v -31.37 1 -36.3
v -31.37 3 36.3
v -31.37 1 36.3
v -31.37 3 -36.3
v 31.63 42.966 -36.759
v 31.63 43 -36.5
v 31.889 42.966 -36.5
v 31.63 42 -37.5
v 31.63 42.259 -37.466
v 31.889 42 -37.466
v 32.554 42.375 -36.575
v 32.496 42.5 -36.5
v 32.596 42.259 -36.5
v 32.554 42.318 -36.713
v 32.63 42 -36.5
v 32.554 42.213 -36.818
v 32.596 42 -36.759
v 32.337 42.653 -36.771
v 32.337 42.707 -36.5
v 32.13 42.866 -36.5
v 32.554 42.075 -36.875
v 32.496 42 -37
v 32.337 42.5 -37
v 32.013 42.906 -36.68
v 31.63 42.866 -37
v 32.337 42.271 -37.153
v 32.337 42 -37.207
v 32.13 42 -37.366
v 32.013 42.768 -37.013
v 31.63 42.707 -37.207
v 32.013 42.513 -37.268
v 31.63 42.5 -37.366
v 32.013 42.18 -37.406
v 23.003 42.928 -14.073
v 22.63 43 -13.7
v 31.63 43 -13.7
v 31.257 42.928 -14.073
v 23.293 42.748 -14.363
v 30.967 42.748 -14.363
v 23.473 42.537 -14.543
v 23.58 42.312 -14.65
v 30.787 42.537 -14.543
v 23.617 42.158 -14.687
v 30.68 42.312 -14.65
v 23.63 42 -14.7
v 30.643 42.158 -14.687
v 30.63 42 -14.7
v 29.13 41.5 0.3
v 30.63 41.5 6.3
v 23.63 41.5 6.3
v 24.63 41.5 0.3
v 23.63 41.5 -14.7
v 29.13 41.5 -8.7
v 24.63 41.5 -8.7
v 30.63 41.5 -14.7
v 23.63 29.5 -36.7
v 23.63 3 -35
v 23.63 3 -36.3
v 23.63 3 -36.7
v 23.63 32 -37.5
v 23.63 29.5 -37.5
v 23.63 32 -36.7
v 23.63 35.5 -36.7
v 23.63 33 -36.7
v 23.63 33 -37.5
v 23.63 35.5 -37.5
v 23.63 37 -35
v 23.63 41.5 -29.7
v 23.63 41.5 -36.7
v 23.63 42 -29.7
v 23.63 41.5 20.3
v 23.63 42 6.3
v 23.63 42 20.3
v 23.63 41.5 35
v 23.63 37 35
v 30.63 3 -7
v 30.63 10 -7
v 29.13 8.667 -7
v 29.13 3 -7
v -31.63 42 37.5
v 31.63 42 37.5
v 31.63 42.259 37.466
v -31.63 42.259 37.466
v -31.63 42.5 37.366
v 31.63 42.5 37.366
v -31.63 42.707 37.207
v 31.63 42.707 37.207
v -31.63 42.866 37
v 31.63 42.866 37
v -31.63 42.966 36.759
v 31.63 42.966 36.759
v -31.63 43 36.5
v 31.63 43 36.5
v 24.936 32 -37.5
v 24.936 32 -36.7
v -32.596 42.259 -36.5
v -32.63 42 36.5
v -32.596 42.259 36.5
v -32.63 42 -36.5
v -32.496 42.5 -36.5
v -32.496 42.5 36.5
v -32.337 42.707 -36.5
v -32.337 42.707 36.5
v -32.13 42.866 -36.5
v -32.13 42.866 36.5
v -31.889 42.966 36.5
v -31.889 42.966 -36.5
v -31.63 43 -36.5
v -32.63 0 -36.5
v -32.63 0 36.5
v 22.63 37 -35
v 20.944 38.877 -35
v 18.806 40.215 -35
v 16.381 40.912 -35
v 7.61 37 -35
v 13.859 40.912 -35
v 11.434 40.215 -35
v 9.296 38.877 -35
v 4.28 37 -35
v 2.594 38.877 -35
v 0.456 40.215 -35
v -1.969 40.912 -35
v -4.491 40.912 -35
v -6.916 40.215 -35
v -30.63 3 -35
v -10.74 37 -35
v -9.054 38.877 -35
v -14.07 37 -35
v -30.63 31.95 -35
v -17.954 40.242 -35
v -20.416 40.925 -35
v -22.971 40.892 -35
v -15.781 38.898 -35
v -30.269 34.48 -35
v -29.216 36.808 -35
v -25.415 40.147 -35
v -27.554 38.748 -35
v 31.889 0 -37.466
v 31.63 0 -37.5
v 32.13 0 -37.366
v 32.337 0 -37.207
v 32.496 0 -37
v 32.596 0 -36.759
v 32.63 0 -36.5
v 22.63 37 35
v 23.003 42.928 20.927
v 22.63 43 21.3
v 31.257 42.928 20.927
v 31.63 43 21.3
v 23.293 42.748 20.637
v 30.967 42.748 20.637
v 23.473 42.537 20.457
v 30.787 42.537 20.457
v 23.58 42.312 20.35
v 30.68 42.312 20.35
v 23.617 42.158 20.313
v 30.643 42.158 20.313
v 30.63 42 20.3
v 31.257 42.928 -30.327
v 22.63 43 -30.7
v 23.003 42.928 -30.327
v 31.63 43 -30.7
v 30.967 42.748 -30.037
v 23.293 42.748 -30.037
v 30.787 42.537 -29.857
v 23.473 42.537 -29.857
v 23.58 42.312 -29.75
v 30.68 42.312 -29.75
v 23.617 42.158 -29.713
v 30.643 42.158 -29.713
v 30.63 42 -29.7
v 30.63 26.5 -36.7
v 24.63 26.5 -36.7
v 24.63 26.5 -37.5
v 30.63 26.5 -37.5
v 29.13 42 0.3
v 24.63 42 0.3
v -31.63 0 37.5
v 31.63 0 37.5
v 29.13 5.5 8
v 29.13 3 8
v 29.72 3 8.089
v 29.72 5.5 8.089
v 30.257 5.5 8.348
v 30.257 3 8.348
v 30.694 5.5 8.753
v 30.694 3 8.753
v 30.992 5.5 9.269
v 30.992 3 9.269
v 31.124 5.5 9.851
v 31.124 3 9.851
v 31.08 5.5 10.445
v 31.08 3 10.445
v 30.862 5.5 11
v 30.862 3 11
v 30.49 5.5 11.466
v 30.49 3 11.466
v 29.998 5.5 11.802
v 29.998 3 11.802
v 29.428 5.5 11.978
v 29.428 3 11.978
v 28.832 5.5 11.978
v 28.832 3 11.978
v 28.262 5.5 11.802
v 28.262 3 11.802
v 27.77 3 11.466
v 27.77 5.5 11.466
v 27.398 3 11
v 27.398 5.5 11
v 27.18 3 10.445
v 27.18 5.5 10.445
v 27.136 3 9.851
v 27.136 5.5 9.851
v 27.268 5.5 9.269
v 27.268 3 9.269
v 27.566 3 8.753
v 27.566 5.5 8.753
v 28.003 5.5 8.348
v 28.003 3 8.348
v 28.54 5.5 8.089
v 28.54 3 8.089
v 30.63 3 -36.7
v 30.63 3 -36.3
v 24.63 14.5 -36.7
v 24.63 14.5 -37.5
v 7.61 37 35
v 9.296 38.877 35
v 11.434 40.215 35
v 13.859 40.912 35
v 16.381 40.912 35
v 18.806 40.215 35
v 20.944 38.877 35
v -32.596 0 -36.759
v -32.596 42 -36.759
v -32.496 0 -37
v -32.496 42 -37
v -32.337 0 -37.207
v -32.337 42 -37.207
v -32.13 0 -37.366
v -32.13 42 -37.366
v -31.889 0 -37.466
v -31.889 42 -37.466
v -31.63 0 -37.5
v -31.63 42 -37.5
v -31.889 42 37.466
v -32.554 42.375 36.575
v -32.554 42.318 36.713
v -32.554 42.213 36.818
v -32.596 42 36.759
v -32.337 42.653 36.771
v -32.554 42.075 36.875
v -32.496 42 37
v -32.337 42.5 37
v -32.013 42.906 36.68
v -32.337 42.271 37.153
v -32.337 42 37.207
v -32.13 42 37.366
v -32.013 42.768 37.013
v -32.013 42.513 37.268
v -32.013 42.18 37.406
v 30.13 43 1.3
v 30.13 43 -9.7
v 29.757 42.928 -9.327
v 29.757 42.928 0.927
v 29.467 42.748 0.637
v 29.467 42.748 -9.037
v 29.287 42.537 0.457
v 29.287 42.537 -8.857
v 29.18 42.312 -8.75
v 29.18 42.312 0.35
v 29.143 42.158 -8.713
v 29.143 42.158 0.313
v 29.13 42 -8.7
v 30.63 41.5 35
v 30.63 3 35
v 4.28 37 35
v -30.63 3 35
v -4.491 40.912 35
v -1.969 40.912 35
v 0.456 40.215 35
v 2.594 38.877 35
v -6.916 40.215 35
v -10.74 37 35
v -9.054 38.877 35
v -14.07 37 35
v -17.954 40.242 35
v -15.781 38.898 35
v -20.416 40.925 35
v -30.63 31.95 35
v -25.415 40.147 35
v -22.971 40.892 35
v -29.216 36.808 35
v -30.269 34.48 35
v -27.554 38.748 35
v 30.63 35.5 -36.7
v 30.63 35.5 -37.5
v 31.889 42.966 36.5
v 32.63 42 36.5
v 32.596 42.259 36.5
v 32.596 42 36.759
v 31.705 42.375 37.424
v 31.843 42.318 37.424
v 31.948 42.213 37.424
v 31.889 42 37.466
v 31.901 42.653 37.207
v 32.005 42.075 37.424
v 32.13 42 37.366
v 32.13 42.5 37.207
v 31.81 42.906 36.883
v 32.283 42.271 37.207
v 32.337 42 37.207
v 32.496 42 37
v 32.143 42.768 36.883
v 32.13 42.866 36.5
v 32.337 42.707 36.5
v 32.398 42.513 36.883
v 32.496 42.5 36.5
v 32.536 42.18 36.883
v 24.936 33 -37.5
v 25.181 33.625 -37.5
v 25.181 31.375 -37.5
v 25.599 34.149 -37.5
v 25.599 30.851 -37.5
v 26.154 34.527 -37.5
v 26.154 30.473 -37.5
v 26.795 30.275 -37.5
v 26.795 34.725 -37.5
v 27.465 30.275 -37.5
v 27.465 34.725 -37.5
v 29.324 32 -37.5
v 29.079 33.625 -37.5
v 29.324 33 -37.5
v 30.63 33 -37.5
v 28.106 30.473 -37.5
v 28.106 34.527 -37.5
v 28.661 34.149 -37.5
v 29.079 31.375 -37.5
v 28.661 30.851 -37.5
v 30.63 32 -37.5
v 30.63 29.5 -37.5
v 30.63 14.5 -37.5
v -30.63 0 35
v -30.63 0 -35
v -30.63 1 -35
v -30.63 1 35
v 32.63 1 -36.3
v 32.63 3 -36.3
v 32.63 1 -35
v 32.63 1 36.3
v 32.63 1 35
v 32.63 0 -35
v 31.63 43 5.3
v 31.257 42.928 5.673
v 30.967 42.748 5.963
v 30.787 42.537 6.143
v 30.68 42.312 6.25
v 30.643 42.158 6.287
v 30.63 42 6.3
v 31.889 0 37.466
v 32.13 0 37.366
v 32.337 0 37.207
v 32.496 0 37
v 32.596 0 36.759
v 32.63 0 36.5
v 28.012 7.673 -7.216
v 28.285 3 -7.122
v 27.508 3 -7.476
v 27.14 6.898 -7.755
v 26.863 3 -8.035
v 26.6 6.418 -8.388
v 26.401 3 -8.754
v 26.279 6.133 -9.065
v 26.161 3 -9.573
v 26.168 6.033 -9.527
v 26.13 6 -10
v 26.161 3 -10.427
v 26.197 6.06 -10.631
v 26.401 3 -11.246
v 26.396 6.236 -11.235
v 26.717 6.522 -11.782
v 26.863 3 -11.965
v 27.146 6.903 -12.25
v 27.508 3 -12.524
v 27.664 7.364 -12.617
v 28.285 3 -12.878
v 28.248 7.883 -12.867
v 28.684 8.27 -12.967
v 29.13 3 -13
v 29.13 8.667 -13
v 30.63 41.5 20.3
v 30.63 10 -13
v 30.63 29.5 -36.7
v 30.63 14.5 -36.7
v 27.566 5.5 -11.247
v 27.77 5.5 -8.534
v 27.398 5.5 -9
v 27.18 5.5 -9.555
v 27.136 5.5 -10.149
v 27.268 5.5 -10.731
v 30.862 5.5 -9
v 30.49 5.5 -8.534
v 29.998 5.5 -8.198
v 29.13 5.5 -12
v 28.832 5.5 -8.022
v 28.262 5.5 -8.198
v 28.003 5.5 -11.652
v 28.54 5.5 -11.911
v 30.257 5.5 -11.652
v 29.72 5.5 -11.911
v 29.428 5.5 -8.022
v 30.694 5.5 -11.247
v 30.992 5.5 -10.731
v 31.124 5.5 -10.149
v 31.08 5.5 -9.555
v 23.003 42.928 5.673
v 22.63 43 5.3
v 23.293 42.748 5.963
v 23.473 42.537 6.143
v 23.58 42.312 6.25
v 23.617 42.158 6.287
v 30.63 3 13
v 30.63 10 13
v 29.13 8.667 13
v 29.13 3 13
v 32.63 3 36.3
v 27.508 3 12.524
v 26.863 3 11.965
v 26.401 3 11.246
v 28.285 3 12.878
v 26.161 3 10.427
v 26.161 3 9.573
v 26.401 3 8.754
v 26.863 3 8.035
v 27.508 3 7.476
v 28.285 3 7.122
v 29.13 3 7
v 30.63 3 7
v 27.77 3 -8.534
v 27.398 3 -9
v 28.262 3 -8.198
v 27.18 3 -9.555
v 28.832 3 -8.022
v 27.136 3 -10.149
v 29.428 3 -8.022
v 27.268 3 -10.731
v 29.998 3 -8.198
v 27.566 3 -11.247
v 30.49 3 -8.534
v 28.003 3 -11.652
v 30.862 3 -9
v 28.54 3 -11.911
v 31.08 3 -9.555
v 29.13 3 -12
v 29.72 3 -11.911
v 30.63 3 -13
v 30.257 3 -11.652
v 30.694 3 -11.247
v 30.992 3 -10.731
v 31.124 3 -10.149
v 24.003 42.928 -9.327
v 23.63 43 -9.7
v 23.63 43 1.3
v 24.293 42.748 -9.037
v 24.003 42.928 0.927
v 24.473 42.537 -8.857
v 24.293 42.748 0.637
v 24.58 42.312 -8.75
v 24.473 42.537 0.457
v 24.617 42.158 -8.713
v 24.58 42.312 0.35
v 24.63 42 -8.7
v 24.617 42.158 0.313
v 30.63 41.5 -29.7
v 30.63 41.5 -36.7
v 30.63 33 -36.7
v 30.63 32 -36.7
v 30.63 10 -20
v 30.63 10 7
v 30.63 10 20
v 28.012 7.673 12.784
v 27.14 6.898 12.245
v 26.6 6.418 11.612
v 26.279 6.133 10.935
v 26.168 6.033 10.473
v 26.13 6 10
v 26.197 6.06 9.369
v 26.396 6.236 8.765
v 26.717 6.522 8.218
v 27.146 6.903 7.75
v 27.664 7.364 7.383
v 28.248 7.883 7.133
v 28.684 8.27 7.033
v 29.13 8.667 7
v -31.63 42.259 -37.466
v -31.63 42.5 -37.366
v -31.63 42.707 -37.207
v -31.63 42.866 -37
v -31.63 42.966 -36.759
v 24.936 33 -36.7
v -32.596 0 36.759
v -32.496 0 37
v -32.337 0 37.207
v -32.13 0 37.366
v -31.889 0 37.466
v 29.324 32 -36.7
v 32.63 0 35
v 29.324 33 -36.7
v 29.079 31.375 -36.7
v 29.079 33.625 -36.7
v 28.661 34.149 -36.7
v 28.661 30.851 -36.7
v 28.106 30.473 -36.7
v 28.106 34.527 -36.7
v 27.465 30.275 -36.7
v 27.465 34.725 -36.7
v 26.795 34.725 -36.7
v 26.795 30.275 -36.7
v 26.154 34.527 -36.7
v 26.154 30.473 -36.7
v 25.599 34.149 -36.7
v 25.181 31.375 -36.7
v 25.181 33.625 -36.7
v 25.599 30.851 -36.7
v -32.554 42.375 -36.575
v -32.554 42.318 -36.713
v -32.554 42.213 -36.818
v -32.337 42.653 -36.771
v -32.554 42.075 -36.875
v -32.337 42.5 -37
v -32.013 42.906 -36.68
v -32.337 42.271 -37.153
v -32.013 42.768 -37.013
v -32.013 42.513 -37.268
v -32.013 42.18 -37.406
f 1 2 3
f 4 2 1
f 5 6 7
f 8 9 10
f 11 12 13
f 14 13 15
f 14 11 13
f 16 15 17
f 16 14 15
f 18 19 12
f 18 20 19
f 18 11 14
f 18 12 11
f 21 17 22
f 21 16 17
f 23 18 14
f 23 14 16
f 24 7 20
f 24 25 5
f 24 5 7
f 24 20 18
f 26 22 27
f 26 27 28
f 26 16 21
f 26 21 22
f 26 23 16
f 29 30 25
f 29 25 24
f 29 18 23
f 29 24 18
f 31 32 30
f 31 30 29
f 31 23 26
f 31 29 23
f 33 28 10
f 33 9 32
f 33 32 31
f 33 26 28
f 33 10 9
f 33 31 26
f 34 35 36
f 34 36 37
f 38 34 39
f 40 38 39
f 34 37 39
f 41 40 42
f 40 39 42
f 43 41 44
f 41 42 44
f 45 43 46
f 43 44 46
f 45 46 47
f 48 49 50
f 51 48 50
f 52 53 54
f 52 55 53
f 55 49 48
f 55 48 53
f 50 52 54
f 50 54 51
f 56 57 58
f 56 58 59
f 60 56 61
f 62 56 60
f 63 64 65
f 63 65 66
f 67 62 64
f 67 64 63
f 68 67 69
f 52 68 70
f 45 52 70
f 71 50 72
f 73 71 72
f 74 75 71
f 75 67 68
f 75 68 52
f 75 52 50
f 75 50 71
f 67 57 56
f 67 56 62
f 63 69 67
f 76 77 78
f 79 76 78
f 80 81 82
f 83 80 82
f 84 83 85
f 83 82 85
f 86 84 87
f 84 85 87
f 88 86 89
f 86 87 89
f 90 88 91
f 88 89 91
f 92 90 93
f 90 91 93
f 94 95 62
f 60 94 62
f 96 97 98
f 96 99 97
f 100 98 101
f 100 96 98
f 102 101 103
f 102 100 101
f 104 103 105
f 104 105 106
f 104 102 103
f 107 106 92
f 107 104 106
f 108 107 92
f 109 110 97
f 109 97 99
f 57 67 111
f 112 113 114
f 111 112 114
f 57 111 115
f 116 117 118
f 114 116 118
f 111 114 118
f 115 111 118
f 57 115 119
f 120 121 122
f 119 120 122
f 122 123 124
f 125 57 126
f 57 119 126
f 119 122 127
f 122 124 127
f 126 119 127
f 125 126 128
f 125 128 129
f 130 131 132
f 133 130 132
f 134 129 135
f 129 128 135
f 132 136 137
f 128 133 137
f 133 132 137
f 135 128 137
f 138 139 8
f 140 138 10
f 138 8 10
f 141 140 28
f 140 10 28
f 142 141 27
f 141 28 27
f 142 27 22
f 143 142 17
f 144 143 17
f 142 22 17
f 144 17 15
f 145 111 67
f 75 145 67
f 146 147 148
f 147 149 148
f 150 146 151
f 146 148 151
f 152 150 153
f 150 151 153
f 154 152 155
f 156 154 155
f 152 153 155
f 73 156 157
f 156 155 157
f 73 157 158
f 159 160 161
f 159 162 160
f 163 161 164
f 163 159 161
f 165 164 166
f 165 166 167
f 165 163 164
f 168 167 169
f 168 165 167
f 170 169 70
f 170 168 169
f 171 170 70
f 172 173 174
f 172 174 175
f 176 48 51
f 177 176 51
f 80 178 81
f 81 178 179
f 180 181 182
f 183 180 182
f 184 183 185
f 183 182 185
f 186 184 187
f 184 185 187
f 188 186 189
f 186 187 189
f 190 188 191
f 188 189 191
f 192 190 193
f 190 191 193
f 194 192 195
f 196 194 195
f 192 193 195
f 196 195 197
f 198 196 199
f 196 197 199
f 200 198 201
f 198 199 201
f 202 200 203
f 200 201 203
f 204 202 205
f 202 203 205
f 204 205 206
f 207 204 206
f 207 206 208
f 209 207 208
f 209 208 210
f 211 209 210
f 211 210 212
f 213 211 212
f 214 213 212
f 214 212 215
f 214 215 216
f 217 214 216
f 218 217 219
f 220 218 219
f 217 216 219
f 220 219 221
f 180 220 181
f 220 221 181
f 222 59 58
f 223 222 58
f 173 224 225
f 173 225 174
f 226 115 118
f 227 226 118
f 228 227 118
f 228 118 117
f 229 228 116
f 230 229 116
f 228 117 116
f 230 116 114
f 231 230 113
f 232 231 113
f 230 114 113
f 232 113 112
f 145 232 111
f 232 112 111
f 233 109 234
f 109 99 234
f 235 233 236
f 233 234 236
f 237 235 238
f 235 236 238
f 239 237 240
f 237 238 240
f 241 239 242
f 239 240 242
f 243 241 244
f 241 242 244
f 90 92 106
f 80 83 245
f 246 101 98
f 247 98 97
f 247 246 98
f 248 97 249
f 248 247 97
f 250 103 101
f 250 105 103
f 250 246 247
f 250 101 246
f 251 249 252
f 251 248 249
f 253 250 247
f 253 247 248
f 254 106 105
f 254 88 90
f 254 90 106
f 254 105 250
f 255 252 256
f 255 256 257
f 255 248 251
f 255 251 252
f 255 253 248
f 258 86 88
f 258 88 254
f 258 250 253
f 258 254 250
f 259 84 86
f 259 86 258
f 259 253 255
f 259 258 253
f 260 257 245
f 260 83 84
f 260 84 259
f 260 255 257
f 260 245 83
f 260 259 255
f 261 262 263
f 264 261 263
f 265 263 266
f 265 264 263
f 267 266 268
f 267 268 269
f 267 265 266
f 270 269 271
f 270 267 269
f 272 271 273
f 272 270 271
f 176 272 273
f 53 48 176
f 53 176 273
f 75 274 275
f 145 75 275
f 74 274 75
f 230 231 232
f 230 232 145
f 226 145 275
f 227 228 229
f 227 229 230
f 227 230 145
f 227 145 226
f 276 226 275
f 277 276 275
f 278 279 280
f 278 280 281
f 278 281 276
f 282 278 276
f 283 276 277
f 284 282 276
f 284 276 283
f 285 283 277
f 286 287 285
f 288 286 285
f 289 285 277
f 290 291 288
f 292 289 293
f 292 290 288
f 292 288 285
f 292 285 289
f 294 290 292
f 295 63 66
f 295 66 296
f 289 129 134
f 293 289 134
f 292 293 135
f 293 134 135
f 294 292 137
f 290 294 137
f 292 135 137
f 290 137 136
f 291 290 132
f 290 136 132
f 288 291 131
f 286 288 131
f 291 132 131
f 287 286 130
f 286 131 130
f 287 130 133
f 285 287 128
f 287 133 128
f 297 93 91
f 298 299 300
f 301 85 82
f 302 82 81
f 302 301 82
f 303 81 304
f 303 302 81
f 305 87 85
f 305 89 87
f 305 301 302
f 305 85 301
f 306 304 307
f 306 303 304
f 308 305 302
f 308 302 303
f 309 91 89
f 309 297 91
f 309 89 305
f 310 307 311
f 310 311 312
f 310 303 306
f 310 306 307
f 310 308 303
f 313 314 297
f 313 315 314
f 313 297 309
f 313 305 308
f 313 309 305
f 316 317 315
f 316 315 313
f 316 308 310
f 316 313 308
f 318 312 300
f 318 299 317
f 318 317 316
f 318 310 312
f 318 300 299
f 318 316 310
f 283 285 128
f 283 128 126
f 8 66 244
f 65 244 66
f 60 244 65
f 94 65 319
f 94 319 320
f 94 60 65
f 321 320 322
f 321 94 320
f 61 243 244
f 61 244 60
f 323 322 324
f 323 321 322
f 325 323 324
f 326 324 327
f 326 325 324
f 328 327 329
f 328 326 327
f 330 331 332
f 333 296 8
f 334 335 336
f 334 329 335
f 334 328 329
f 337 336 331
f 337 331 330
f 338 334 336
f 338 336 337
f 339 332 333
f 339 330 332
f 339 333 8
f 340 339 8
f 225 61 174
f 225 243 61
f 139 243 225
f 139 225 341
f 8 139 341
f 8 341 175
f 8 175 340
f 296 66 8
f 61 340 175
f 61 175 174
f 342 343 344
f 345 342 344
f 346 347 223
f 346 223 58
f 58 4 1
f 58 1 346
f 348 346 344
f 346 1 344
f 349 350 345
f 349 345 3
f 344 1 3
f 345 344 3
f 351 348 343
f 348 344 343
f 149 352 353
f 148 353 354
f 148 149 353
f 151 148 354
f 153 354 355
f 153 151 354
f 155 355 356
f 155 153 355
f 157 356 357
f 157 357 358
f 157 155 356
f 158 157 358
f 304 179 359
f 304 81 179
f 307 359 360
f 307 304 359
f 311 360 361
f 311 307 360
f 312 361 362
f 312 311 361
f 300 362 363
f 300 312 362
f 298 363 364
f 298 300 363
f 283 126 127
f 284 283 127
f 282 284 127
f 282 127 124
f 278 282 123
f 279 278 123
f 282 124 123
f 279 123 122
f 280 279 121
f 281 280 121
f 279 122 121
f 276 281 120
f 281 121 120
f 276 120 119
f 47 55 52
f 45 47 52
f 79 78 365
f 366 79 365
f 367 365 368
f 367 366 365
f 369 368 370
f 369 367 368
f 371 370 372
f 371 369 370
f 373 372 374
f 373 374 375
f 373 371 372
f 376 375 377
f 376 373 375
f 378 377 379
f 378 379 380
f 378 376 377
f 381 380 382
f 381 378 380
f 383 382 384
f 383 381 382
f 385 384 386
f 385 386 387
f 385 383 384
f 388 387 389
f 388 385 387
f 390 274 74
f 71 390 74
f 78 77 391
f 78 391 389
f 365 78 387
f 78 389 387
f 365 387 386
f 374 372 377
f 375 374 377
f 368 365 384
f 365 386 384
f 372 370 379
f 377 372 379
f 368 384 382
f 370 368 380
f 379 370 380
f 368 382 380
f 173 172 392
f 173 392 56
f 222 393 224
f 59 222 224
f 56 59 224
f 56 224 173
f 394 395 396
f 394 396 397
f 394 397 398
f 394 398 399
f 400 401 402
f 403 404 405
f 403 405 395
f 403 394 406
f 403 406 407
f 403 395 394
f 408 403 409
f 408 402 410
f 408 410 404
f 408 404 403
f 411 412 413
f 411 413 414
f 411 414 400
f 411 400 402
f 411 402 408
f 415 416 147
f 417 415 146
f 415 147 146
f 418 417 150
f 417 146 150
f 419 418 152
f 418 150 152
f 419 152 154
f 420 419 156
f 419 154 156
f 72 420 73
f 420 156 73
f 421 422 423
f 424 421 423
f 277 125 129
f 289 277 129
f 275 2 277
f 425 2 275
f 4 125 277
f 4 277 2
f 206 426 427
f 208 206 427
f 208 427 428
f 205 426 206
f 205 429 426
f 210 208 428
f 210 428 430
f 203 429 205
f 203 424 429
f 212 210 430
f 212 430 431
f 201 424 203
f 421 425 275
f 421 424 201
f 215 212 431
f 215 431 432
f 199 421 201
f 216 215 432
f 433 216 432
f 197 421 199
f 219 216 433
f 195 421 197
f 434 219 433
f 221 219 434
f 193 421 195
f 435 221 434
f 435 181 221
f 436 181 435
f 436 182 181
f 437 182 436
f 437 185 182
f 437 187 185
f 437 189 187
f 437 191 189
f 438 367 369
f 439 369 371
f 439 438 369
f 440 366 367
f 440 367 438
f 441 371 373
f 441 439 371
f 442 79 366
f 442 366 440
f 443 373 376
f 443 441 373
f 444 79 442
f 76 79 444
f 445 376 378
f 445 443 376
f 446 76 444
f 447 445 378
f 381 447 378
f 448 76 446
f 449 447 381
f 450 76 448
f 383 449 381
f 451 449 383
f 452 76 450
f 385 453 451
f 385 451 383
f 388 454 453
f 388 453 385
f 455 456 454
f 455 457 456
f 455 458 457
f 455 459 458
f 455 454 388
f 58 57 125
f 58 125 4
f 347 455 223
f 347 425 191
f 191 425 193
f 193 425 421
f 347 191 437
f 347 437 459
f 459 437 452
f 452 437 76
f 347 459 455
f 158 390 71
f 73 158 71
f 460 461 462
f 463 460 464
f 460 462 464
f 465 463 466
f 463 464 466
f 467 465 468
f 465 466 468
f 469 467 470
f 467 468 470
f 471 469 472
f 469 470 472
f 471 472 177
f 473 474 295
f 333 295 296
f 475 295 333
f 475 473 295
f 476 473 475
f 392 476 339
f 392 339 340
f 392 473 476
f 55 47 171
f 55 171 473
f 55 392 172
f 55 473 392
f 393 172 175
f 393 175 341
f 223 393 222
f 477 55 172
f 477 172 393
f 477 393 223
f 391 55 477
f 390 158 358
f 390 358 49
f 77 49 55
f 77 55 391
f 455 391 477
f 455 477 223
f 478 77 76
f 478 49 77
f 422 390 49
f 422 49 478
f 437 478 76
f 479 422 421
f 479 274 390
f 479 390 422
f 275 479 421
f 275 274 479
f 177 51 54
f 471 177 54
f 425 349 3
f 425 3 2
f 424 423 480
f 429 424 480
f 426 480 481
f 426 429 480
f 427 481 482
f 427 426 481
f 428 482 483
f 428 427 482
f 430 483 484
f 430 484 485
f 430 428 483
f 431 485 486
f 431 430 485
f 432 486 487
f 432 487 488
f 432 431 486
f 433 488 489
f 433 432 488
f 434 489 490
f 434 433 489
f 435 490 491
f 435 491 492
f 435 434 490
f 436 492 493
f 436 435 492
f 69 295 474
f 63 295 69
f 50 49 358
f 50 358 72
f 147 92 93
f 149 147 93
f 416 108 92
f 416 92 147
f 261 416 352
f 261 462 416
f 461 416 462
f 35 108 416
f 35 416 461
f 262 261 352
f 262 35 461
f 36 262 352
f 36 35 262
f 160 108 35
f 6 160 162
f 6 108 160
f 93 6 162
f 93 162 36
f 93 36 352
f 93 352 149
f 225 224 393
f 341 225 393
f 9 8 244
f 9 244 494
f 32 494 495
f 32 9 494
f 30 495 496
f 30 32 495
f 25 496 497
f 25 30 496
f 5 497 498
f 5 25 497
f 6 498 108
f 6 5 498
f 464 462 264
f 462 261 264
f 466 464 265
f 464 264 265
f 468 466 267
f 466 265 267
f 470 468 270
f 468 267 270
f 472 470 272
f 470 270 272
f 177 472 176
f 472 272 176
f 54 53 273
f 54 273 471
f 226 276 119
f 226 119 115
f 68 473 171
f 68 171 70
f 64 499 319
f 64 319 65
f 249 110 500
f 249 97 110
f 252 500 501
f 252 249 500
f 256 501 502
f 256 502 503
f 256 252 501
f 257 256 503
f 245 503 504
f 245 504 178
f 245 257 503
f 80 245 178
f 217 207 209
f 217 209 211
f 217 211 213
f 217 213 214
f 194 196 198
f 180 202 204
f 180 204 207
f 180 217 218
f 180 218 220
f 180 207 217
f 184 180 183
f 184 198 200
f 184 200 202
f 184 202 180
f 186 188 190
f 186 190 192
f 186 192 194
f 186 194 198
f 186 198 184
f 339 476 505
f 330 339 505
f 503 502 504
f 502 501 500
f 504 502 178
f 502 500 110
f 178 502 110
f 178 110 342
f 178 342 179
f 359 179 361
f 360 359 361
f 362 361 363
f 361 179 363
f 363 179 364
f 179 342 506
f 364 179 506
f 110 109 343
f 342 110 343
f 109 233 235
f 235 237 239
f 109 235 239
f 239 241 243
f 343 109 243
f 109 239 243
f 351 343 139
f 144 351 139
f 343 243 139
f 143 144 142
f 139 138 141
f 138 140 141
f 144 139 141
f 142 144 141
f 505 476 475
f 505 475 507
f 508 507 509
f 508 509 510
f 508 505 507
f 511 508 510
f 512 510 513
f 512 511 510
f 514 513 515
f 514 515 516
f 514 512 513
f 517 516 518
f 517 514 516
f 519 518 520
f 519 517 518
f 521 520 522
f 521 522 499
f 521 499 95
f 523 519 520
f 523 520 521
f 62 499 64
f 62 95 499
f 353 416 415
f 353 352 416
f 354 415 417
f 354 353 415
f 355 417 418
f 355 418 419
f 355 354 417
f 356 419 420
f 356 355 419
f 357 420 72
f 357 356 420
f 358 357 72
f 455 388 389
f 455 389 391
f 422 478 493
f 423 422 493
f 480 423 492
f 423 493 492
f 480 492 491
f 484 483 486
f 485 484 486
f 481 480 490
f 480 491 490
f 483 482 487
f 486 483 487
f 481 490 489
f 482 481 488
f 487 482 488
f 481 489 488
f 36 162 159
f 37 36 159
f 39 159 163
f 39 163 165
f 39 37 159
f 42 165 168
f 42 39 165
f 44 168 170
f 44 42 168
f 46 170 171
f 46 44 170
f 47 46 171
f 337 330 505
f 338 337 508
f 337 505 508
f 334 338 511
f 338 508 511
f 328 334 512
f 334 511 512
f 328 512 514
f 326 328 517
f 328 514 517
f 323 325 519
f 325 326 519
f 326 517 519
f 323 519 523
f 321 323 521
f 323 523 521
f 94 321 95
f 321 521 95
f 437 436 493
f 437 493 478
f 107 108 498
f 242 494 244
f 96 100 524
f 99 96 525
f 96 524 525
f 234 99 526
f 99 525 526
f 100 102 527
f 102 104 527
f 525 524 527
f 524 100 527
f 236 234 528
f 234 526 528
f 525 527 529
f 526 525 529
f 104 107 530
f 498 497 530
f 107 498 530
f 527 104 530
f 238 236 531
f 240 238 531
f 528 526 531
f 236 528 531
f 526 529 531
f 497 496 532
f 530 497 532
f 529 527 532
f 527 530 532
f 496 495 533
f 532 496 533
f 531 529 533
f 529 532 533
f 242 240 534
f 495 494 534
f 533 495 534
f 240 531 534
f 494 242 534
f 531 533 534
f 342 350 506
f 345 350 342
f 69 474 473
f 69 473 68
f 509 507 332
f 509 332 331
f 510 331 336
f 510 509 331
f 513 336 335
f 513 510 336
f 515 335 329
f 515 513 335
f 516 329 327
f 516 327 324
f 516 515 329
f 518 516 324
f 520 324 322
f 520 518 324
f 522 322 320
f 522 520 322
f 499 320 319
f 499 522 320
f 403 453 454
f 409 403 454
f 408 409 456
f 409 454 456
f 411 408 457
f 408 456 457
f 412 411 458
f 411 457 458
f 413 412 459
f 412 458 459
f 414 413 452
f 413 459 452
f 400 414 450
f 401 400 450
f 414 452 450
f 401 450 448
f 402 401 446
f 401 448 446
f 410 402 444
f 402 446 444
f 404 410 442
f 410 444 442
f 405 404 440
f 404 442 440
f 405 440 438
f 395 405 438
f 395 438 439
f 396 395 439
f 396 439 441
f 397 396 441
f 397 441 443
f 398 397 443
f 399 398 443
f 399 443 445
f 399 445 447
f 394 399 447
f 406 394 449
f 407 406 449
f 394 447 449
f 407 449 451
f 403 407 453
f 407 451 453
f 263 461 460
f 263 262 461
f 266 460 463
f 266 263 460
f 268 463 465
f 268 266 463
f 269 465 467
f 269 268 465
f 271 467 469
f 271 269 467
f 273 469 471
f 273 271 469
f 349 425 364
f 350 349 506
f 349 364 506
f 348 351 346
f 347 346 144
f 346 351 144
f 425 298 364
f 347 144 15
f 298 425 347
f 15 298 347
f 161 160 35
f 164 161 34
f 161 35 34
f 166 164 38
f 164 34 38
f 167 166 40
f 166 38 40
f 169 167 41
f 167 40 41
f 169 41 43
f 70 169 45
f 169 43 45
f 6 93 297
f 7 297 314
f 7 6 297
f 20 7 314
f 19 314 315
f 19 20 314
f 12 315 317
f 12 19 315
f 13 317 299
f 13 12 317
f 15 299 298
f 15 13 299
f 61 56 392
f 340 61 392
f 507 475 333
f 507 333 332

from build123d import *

# Parameters (mm, degrees)
SKETCH1_W               = 65.26
SKETCH1_H               = 75
BOSS_EXTRUDE1_DEPTH     = 43
CUT_EXTRUDE1_DEPTH      = 35
CUT_EXTRUDE1_DEPTH_BACK = 35
SKETCH4_W               = 7
SKETCH4_H               = 1.7
CUT_EXTRUDE2_DEPTH      = 41.5
SKETCH5_W               = 7
SKETCH5_H               = 14
SKETCH5_H_2             = 15
SKETCH5_W_2             = 4.5
SKETCH5_H_3             = 9
CUT_EXTRUDE3_DEPTH      = 65.755053085
SKETCH7_W               = 6
SKETCH7_H               = 12
CUT_EXTRUDE4_DEPTH      = 92.75705368
FILLET1_R               = 1
BOSS_EXTRUDE2_DEPTH     = 10
CUT_EXTRUDE5_DEPTH      = 20
CUT_EXTRUDE5_DEPTH_BACK = 20
SKETCH12_W              = 72.6
SKETCH12_H              = 2
CUT_EXTRUDE6_DEPTH      = 64
SKETCH13_W              = 6.500006658
SKETCH13_H              = 70
CUT_EXTRUDE7_DEPTH      = 3
BOSS_EXTRUDE3_DEPTH     = 7
SKETCH17_R              = 2
CUT_EXTRUDE9_DEPTH      = 2.5


with BuildPart() as part:
    # Sketch1 → Boss-Extrude1 (new body)
    with BuildSketch(Plane(origin=(0, 0, 0), x_dir=(1, 0, 0), z_dir=(0, 1, 0))):
        Rectangle(SKETCH1_W, SKETCH1_H)
    extrude(amount=BOSS_EXTRUDE1_DEPTH)

    # Sketch3 → Cut-Extrude1 (cut, two sides: drawn at the far end of the back side and taken through both)
    with BuildSketch(Plane.XY.offset(-CUT_EXTRUDE1_DEPTH_BACK)):
        with BuildLine():
            Line((30.629993342, 0), (-30.63, 0))
            Line((-30.63, 0), (-30.63, 31.95))
            ThreePointArc((-30.63, 31.95), (-24.219797365, 40.606440947), (-14.070006658, 37))
            Line((-14.070006658, 37), (-10.739993342, 37))
            ThreePointArc((-10.739993342, 37), (-3.23, 41), (4.279993342, 37))
            Line((4.279993342, 37), (7.610006658, 37))
            ThreePointArc((7.610006658, 37), (15.12, 41), (22.629993342, 37))
            Line((22.629993342, 37), (23.629993342, 37))
            Line((23.629993342, 37), (23.629993342, 41.5))
            Line((23.629993342, 41.5), (30.629993342, 41.5))
            Line((30.629993342, 41.5), (30.629993342, 0))
        make_face()
    extrude(amount=CUT_EXTRUDE1_DEPTH + CUT_EXTRUDE1_DEPTH_BACK, mode=Mode.SUBTRACT)

    # Sketch4 → Cut-Extrude2 (cut)
    with BuildSketch(Plane(origin=(0, 0, 0), x_dir=(-1, 0, 0), z_dir=(0, -1, 0))):
        with Locations((-27.129993342, 35.85)):
            Rectangle(SKETCH4_W, SKETCH4_H)
    extrude(amount=-CUT_EXTRUDE2_DEPTH, mode=Mode.SUBTRACT)

    # Sketch5 → Cut-Extrude3 (cut, through all)
    with BuildSketch(Plane(origin=(0, 41.5, 0), x_dir=(-1, 0, 0), z_dir=(0, -1, 0))):
        with Locations((-27.129993342, -13.3)):
            Rectangle(SKETCH5_W, SKETCH5_H)
        with Locations((-27.129993342, 22.2)):
            Rectangle(SKETCH5_W, SKETCH5_H_2)
        with Locations((-26.879993342, 4.2)):
            Rectangle(SKETCH5_W_2, SKETCH5_H_3)
    extrude(amount=-CUT_EXTRUDE3_DEPTH, mode=Mode.SUBTRACT)

    # Sketch7 → Cut-Extrude4 (cut, through all)
    with BuildSketch(Plane.XY.offset(-36.7)):
        with BuildLine():
            Line((23.629993342, 29.5), (30.629993342, 29.5))
            Line((30.629993342, 29.5), (30.629993342, 32))
            Line((30.629993342, 32), (29.323734439, 32))
            ThreePointArc((29.323734439, 32), (27.129993342, 30.25), (24.936252245, 32))
            Line((24.936252245, 32), (23.629993342, 32))
            Line((23.629993342, 32), (23.629993342, 29.5))
        make_face()
        with BuildLine():
            Line((23.629993342, 35.5), (30.629993342, 35.5))
            Line((30.629993342, 35.5), (30.629993342, 33))
            Line((30.629993342, 33), (29.323734439, 33))
            ThreePointArc((29.323734439, 33), (27.129993342, 34.75), (24.936252245, 33))
            Line((24.936252245, 33), (23.629993342, 33))
            Line((23.629993342, 33), (23.629993342, 35.5))
        make_face()
        with Locations((27.629993342, 20.5)):
            Rectangle(SKETCH7_W, SKETCH7_H)
    extrude(amount=-CUT_EXTRUDE4_DEPTH, mode=Mode.SUBTRACT)

    # Fillet1
    fillet1_edges = [part.edges().sort_by_distance(p)[0] for p in [
        (0, 43, -37.5),
        (32.63, 43, 0),
        (0, 43, 37.5),
        (-32.63, 43, 0),
        (29.129993342, 43, -4.2),
        (26.879993342, 43, -8.7),
        (24.629993342, 43, -4.2),
        (26.879993342, 43, 0.3),
        (30.629993342, 43, -22.2),
        (27.129993342, 43, -29.7),
        (23.629993342, 43, -22.2),
        (27.129993342, 43, -14.7),
        (30.629993342, 43, 13.3),
        (27.129993342, 43, 6.3),
        (23.629993342, 43, 13.3),
        (27.129993342, 43, 20.3),
        (32.63, 21.5, 37.5),
        (32.63, 21.5, -37.5),
        (-32.63, 21.5, 37.5),
        (-32.63, 21.5, -37.5),
    ]]
    fillet(fillet1_edges, radius=FILLET1_R - 0.0001)  # a hair under: the kernel refuses the full size

    # Sketch8 → Boss-Extrude2 (add)
    with BuildSketch(Plane(origin=(0, 0, 0), x_dir=(-1, 0, 0), z_dir=(0, -1, 0))):
        with BuildLine():
            Line((-30.629993342, 7), (-29.129993342, 7))
            ThreePointArc((-29.129993342, 7), (-26.129993342, 10), (-29.129993342, 13))
            Line((-29.129993342, 13), (-30.629993342, 13))
            Line((-30.629993342, 13), (-30.629993342, 7))
        make_face()
        with BuildLine():
            Line((-30.629993342, -13), (-29.129993342, -13))
            ThreePointArc((-29.129993342, -13), (-26.129993342, -10), (-29.129993342, -7))
            Line((-29.129993342, -7), (-30.629993342, -7))
            Line((-30.629993342, -7), (-30.629993342, -13))
        make_face()
    extrude(amount=-BOSS_EXTRUDE2_DEPTH)

    # Sketch11 → Cut-Extrude5 (cut, two sides: drawn at the far end of the back side and taken through both)
    with BuildSketch(Plane.XY.offset(-CUT_EXTRUDE5_DEPTH_BACK)):
        Polygon((30.629993342, 10), (26.129993342, 6), (26.129993342, 10), align=None)
    extrude(amount=CUT_EXTRUDE5_DEPTH + CUT_EXTRUDE5_DEPTH_BACK, mode=Mode.SUBTRACT)

    # Sketch12 → Cut-Extrude6 (cut)
    with BuildSketch(Plane(origin=(32.63, 0, 0), x_dir=(0, 0, -1), z_dir=(1, 0, 0))):
        with Locations((0, 2)):
            Rectangle(SKETCH12_W, SKETCH12_H)
    extrude(amount=-CUT_EXTRUDE6_DEPTH, mode=Mode.SUBTRACT)

    # Sketch13 → Cut-Extrude7 (cut)
    with BuildSketch(Plane.XZ):
        with Locations((29.379996671, 0)):
            Rectangle(SKETCH13_W, SKETCH13_H)
    extrude(amount=-CUT_EXTRUDE7_DEPTH, mode=Mode.SUBTRACT)

    # Sketch15 → Boss-Extrude3 (add)
    with BuildSketch(Plane(origin=(23.629993342, 0, 0), x_dir=(0, 0, -1), z_dir=(1, 0, 0))):
        Polygon((36.7, 0), (36.7, 3), (36.3, 3), (36.3, 1), (35, 1), (35, 0), align=None)
    extrude(amount=BOSS_EXTRUDE3_DEPTH)

    # Sketch17 → Cut-Extrude9 (cut)
    with BuildSketch(Plane(origin=(0, 3, 0), x_dir=(-1, 0, 0), z_dir=(0, -1, 0))):
        with Locations(Location((-29.129993342, 10, 0), (0, 0, 90))):
            Circle(SKETCH17_R)
        with Locations(Location((-29.129993342, -10, 0), (0, 0, 90))):
            Circle(SKETCH17_R)
    extrude(amount=-CUT_EXTRUDE9_DEPTH, mode=Mode.SUBTRACT)


solid = part.part
